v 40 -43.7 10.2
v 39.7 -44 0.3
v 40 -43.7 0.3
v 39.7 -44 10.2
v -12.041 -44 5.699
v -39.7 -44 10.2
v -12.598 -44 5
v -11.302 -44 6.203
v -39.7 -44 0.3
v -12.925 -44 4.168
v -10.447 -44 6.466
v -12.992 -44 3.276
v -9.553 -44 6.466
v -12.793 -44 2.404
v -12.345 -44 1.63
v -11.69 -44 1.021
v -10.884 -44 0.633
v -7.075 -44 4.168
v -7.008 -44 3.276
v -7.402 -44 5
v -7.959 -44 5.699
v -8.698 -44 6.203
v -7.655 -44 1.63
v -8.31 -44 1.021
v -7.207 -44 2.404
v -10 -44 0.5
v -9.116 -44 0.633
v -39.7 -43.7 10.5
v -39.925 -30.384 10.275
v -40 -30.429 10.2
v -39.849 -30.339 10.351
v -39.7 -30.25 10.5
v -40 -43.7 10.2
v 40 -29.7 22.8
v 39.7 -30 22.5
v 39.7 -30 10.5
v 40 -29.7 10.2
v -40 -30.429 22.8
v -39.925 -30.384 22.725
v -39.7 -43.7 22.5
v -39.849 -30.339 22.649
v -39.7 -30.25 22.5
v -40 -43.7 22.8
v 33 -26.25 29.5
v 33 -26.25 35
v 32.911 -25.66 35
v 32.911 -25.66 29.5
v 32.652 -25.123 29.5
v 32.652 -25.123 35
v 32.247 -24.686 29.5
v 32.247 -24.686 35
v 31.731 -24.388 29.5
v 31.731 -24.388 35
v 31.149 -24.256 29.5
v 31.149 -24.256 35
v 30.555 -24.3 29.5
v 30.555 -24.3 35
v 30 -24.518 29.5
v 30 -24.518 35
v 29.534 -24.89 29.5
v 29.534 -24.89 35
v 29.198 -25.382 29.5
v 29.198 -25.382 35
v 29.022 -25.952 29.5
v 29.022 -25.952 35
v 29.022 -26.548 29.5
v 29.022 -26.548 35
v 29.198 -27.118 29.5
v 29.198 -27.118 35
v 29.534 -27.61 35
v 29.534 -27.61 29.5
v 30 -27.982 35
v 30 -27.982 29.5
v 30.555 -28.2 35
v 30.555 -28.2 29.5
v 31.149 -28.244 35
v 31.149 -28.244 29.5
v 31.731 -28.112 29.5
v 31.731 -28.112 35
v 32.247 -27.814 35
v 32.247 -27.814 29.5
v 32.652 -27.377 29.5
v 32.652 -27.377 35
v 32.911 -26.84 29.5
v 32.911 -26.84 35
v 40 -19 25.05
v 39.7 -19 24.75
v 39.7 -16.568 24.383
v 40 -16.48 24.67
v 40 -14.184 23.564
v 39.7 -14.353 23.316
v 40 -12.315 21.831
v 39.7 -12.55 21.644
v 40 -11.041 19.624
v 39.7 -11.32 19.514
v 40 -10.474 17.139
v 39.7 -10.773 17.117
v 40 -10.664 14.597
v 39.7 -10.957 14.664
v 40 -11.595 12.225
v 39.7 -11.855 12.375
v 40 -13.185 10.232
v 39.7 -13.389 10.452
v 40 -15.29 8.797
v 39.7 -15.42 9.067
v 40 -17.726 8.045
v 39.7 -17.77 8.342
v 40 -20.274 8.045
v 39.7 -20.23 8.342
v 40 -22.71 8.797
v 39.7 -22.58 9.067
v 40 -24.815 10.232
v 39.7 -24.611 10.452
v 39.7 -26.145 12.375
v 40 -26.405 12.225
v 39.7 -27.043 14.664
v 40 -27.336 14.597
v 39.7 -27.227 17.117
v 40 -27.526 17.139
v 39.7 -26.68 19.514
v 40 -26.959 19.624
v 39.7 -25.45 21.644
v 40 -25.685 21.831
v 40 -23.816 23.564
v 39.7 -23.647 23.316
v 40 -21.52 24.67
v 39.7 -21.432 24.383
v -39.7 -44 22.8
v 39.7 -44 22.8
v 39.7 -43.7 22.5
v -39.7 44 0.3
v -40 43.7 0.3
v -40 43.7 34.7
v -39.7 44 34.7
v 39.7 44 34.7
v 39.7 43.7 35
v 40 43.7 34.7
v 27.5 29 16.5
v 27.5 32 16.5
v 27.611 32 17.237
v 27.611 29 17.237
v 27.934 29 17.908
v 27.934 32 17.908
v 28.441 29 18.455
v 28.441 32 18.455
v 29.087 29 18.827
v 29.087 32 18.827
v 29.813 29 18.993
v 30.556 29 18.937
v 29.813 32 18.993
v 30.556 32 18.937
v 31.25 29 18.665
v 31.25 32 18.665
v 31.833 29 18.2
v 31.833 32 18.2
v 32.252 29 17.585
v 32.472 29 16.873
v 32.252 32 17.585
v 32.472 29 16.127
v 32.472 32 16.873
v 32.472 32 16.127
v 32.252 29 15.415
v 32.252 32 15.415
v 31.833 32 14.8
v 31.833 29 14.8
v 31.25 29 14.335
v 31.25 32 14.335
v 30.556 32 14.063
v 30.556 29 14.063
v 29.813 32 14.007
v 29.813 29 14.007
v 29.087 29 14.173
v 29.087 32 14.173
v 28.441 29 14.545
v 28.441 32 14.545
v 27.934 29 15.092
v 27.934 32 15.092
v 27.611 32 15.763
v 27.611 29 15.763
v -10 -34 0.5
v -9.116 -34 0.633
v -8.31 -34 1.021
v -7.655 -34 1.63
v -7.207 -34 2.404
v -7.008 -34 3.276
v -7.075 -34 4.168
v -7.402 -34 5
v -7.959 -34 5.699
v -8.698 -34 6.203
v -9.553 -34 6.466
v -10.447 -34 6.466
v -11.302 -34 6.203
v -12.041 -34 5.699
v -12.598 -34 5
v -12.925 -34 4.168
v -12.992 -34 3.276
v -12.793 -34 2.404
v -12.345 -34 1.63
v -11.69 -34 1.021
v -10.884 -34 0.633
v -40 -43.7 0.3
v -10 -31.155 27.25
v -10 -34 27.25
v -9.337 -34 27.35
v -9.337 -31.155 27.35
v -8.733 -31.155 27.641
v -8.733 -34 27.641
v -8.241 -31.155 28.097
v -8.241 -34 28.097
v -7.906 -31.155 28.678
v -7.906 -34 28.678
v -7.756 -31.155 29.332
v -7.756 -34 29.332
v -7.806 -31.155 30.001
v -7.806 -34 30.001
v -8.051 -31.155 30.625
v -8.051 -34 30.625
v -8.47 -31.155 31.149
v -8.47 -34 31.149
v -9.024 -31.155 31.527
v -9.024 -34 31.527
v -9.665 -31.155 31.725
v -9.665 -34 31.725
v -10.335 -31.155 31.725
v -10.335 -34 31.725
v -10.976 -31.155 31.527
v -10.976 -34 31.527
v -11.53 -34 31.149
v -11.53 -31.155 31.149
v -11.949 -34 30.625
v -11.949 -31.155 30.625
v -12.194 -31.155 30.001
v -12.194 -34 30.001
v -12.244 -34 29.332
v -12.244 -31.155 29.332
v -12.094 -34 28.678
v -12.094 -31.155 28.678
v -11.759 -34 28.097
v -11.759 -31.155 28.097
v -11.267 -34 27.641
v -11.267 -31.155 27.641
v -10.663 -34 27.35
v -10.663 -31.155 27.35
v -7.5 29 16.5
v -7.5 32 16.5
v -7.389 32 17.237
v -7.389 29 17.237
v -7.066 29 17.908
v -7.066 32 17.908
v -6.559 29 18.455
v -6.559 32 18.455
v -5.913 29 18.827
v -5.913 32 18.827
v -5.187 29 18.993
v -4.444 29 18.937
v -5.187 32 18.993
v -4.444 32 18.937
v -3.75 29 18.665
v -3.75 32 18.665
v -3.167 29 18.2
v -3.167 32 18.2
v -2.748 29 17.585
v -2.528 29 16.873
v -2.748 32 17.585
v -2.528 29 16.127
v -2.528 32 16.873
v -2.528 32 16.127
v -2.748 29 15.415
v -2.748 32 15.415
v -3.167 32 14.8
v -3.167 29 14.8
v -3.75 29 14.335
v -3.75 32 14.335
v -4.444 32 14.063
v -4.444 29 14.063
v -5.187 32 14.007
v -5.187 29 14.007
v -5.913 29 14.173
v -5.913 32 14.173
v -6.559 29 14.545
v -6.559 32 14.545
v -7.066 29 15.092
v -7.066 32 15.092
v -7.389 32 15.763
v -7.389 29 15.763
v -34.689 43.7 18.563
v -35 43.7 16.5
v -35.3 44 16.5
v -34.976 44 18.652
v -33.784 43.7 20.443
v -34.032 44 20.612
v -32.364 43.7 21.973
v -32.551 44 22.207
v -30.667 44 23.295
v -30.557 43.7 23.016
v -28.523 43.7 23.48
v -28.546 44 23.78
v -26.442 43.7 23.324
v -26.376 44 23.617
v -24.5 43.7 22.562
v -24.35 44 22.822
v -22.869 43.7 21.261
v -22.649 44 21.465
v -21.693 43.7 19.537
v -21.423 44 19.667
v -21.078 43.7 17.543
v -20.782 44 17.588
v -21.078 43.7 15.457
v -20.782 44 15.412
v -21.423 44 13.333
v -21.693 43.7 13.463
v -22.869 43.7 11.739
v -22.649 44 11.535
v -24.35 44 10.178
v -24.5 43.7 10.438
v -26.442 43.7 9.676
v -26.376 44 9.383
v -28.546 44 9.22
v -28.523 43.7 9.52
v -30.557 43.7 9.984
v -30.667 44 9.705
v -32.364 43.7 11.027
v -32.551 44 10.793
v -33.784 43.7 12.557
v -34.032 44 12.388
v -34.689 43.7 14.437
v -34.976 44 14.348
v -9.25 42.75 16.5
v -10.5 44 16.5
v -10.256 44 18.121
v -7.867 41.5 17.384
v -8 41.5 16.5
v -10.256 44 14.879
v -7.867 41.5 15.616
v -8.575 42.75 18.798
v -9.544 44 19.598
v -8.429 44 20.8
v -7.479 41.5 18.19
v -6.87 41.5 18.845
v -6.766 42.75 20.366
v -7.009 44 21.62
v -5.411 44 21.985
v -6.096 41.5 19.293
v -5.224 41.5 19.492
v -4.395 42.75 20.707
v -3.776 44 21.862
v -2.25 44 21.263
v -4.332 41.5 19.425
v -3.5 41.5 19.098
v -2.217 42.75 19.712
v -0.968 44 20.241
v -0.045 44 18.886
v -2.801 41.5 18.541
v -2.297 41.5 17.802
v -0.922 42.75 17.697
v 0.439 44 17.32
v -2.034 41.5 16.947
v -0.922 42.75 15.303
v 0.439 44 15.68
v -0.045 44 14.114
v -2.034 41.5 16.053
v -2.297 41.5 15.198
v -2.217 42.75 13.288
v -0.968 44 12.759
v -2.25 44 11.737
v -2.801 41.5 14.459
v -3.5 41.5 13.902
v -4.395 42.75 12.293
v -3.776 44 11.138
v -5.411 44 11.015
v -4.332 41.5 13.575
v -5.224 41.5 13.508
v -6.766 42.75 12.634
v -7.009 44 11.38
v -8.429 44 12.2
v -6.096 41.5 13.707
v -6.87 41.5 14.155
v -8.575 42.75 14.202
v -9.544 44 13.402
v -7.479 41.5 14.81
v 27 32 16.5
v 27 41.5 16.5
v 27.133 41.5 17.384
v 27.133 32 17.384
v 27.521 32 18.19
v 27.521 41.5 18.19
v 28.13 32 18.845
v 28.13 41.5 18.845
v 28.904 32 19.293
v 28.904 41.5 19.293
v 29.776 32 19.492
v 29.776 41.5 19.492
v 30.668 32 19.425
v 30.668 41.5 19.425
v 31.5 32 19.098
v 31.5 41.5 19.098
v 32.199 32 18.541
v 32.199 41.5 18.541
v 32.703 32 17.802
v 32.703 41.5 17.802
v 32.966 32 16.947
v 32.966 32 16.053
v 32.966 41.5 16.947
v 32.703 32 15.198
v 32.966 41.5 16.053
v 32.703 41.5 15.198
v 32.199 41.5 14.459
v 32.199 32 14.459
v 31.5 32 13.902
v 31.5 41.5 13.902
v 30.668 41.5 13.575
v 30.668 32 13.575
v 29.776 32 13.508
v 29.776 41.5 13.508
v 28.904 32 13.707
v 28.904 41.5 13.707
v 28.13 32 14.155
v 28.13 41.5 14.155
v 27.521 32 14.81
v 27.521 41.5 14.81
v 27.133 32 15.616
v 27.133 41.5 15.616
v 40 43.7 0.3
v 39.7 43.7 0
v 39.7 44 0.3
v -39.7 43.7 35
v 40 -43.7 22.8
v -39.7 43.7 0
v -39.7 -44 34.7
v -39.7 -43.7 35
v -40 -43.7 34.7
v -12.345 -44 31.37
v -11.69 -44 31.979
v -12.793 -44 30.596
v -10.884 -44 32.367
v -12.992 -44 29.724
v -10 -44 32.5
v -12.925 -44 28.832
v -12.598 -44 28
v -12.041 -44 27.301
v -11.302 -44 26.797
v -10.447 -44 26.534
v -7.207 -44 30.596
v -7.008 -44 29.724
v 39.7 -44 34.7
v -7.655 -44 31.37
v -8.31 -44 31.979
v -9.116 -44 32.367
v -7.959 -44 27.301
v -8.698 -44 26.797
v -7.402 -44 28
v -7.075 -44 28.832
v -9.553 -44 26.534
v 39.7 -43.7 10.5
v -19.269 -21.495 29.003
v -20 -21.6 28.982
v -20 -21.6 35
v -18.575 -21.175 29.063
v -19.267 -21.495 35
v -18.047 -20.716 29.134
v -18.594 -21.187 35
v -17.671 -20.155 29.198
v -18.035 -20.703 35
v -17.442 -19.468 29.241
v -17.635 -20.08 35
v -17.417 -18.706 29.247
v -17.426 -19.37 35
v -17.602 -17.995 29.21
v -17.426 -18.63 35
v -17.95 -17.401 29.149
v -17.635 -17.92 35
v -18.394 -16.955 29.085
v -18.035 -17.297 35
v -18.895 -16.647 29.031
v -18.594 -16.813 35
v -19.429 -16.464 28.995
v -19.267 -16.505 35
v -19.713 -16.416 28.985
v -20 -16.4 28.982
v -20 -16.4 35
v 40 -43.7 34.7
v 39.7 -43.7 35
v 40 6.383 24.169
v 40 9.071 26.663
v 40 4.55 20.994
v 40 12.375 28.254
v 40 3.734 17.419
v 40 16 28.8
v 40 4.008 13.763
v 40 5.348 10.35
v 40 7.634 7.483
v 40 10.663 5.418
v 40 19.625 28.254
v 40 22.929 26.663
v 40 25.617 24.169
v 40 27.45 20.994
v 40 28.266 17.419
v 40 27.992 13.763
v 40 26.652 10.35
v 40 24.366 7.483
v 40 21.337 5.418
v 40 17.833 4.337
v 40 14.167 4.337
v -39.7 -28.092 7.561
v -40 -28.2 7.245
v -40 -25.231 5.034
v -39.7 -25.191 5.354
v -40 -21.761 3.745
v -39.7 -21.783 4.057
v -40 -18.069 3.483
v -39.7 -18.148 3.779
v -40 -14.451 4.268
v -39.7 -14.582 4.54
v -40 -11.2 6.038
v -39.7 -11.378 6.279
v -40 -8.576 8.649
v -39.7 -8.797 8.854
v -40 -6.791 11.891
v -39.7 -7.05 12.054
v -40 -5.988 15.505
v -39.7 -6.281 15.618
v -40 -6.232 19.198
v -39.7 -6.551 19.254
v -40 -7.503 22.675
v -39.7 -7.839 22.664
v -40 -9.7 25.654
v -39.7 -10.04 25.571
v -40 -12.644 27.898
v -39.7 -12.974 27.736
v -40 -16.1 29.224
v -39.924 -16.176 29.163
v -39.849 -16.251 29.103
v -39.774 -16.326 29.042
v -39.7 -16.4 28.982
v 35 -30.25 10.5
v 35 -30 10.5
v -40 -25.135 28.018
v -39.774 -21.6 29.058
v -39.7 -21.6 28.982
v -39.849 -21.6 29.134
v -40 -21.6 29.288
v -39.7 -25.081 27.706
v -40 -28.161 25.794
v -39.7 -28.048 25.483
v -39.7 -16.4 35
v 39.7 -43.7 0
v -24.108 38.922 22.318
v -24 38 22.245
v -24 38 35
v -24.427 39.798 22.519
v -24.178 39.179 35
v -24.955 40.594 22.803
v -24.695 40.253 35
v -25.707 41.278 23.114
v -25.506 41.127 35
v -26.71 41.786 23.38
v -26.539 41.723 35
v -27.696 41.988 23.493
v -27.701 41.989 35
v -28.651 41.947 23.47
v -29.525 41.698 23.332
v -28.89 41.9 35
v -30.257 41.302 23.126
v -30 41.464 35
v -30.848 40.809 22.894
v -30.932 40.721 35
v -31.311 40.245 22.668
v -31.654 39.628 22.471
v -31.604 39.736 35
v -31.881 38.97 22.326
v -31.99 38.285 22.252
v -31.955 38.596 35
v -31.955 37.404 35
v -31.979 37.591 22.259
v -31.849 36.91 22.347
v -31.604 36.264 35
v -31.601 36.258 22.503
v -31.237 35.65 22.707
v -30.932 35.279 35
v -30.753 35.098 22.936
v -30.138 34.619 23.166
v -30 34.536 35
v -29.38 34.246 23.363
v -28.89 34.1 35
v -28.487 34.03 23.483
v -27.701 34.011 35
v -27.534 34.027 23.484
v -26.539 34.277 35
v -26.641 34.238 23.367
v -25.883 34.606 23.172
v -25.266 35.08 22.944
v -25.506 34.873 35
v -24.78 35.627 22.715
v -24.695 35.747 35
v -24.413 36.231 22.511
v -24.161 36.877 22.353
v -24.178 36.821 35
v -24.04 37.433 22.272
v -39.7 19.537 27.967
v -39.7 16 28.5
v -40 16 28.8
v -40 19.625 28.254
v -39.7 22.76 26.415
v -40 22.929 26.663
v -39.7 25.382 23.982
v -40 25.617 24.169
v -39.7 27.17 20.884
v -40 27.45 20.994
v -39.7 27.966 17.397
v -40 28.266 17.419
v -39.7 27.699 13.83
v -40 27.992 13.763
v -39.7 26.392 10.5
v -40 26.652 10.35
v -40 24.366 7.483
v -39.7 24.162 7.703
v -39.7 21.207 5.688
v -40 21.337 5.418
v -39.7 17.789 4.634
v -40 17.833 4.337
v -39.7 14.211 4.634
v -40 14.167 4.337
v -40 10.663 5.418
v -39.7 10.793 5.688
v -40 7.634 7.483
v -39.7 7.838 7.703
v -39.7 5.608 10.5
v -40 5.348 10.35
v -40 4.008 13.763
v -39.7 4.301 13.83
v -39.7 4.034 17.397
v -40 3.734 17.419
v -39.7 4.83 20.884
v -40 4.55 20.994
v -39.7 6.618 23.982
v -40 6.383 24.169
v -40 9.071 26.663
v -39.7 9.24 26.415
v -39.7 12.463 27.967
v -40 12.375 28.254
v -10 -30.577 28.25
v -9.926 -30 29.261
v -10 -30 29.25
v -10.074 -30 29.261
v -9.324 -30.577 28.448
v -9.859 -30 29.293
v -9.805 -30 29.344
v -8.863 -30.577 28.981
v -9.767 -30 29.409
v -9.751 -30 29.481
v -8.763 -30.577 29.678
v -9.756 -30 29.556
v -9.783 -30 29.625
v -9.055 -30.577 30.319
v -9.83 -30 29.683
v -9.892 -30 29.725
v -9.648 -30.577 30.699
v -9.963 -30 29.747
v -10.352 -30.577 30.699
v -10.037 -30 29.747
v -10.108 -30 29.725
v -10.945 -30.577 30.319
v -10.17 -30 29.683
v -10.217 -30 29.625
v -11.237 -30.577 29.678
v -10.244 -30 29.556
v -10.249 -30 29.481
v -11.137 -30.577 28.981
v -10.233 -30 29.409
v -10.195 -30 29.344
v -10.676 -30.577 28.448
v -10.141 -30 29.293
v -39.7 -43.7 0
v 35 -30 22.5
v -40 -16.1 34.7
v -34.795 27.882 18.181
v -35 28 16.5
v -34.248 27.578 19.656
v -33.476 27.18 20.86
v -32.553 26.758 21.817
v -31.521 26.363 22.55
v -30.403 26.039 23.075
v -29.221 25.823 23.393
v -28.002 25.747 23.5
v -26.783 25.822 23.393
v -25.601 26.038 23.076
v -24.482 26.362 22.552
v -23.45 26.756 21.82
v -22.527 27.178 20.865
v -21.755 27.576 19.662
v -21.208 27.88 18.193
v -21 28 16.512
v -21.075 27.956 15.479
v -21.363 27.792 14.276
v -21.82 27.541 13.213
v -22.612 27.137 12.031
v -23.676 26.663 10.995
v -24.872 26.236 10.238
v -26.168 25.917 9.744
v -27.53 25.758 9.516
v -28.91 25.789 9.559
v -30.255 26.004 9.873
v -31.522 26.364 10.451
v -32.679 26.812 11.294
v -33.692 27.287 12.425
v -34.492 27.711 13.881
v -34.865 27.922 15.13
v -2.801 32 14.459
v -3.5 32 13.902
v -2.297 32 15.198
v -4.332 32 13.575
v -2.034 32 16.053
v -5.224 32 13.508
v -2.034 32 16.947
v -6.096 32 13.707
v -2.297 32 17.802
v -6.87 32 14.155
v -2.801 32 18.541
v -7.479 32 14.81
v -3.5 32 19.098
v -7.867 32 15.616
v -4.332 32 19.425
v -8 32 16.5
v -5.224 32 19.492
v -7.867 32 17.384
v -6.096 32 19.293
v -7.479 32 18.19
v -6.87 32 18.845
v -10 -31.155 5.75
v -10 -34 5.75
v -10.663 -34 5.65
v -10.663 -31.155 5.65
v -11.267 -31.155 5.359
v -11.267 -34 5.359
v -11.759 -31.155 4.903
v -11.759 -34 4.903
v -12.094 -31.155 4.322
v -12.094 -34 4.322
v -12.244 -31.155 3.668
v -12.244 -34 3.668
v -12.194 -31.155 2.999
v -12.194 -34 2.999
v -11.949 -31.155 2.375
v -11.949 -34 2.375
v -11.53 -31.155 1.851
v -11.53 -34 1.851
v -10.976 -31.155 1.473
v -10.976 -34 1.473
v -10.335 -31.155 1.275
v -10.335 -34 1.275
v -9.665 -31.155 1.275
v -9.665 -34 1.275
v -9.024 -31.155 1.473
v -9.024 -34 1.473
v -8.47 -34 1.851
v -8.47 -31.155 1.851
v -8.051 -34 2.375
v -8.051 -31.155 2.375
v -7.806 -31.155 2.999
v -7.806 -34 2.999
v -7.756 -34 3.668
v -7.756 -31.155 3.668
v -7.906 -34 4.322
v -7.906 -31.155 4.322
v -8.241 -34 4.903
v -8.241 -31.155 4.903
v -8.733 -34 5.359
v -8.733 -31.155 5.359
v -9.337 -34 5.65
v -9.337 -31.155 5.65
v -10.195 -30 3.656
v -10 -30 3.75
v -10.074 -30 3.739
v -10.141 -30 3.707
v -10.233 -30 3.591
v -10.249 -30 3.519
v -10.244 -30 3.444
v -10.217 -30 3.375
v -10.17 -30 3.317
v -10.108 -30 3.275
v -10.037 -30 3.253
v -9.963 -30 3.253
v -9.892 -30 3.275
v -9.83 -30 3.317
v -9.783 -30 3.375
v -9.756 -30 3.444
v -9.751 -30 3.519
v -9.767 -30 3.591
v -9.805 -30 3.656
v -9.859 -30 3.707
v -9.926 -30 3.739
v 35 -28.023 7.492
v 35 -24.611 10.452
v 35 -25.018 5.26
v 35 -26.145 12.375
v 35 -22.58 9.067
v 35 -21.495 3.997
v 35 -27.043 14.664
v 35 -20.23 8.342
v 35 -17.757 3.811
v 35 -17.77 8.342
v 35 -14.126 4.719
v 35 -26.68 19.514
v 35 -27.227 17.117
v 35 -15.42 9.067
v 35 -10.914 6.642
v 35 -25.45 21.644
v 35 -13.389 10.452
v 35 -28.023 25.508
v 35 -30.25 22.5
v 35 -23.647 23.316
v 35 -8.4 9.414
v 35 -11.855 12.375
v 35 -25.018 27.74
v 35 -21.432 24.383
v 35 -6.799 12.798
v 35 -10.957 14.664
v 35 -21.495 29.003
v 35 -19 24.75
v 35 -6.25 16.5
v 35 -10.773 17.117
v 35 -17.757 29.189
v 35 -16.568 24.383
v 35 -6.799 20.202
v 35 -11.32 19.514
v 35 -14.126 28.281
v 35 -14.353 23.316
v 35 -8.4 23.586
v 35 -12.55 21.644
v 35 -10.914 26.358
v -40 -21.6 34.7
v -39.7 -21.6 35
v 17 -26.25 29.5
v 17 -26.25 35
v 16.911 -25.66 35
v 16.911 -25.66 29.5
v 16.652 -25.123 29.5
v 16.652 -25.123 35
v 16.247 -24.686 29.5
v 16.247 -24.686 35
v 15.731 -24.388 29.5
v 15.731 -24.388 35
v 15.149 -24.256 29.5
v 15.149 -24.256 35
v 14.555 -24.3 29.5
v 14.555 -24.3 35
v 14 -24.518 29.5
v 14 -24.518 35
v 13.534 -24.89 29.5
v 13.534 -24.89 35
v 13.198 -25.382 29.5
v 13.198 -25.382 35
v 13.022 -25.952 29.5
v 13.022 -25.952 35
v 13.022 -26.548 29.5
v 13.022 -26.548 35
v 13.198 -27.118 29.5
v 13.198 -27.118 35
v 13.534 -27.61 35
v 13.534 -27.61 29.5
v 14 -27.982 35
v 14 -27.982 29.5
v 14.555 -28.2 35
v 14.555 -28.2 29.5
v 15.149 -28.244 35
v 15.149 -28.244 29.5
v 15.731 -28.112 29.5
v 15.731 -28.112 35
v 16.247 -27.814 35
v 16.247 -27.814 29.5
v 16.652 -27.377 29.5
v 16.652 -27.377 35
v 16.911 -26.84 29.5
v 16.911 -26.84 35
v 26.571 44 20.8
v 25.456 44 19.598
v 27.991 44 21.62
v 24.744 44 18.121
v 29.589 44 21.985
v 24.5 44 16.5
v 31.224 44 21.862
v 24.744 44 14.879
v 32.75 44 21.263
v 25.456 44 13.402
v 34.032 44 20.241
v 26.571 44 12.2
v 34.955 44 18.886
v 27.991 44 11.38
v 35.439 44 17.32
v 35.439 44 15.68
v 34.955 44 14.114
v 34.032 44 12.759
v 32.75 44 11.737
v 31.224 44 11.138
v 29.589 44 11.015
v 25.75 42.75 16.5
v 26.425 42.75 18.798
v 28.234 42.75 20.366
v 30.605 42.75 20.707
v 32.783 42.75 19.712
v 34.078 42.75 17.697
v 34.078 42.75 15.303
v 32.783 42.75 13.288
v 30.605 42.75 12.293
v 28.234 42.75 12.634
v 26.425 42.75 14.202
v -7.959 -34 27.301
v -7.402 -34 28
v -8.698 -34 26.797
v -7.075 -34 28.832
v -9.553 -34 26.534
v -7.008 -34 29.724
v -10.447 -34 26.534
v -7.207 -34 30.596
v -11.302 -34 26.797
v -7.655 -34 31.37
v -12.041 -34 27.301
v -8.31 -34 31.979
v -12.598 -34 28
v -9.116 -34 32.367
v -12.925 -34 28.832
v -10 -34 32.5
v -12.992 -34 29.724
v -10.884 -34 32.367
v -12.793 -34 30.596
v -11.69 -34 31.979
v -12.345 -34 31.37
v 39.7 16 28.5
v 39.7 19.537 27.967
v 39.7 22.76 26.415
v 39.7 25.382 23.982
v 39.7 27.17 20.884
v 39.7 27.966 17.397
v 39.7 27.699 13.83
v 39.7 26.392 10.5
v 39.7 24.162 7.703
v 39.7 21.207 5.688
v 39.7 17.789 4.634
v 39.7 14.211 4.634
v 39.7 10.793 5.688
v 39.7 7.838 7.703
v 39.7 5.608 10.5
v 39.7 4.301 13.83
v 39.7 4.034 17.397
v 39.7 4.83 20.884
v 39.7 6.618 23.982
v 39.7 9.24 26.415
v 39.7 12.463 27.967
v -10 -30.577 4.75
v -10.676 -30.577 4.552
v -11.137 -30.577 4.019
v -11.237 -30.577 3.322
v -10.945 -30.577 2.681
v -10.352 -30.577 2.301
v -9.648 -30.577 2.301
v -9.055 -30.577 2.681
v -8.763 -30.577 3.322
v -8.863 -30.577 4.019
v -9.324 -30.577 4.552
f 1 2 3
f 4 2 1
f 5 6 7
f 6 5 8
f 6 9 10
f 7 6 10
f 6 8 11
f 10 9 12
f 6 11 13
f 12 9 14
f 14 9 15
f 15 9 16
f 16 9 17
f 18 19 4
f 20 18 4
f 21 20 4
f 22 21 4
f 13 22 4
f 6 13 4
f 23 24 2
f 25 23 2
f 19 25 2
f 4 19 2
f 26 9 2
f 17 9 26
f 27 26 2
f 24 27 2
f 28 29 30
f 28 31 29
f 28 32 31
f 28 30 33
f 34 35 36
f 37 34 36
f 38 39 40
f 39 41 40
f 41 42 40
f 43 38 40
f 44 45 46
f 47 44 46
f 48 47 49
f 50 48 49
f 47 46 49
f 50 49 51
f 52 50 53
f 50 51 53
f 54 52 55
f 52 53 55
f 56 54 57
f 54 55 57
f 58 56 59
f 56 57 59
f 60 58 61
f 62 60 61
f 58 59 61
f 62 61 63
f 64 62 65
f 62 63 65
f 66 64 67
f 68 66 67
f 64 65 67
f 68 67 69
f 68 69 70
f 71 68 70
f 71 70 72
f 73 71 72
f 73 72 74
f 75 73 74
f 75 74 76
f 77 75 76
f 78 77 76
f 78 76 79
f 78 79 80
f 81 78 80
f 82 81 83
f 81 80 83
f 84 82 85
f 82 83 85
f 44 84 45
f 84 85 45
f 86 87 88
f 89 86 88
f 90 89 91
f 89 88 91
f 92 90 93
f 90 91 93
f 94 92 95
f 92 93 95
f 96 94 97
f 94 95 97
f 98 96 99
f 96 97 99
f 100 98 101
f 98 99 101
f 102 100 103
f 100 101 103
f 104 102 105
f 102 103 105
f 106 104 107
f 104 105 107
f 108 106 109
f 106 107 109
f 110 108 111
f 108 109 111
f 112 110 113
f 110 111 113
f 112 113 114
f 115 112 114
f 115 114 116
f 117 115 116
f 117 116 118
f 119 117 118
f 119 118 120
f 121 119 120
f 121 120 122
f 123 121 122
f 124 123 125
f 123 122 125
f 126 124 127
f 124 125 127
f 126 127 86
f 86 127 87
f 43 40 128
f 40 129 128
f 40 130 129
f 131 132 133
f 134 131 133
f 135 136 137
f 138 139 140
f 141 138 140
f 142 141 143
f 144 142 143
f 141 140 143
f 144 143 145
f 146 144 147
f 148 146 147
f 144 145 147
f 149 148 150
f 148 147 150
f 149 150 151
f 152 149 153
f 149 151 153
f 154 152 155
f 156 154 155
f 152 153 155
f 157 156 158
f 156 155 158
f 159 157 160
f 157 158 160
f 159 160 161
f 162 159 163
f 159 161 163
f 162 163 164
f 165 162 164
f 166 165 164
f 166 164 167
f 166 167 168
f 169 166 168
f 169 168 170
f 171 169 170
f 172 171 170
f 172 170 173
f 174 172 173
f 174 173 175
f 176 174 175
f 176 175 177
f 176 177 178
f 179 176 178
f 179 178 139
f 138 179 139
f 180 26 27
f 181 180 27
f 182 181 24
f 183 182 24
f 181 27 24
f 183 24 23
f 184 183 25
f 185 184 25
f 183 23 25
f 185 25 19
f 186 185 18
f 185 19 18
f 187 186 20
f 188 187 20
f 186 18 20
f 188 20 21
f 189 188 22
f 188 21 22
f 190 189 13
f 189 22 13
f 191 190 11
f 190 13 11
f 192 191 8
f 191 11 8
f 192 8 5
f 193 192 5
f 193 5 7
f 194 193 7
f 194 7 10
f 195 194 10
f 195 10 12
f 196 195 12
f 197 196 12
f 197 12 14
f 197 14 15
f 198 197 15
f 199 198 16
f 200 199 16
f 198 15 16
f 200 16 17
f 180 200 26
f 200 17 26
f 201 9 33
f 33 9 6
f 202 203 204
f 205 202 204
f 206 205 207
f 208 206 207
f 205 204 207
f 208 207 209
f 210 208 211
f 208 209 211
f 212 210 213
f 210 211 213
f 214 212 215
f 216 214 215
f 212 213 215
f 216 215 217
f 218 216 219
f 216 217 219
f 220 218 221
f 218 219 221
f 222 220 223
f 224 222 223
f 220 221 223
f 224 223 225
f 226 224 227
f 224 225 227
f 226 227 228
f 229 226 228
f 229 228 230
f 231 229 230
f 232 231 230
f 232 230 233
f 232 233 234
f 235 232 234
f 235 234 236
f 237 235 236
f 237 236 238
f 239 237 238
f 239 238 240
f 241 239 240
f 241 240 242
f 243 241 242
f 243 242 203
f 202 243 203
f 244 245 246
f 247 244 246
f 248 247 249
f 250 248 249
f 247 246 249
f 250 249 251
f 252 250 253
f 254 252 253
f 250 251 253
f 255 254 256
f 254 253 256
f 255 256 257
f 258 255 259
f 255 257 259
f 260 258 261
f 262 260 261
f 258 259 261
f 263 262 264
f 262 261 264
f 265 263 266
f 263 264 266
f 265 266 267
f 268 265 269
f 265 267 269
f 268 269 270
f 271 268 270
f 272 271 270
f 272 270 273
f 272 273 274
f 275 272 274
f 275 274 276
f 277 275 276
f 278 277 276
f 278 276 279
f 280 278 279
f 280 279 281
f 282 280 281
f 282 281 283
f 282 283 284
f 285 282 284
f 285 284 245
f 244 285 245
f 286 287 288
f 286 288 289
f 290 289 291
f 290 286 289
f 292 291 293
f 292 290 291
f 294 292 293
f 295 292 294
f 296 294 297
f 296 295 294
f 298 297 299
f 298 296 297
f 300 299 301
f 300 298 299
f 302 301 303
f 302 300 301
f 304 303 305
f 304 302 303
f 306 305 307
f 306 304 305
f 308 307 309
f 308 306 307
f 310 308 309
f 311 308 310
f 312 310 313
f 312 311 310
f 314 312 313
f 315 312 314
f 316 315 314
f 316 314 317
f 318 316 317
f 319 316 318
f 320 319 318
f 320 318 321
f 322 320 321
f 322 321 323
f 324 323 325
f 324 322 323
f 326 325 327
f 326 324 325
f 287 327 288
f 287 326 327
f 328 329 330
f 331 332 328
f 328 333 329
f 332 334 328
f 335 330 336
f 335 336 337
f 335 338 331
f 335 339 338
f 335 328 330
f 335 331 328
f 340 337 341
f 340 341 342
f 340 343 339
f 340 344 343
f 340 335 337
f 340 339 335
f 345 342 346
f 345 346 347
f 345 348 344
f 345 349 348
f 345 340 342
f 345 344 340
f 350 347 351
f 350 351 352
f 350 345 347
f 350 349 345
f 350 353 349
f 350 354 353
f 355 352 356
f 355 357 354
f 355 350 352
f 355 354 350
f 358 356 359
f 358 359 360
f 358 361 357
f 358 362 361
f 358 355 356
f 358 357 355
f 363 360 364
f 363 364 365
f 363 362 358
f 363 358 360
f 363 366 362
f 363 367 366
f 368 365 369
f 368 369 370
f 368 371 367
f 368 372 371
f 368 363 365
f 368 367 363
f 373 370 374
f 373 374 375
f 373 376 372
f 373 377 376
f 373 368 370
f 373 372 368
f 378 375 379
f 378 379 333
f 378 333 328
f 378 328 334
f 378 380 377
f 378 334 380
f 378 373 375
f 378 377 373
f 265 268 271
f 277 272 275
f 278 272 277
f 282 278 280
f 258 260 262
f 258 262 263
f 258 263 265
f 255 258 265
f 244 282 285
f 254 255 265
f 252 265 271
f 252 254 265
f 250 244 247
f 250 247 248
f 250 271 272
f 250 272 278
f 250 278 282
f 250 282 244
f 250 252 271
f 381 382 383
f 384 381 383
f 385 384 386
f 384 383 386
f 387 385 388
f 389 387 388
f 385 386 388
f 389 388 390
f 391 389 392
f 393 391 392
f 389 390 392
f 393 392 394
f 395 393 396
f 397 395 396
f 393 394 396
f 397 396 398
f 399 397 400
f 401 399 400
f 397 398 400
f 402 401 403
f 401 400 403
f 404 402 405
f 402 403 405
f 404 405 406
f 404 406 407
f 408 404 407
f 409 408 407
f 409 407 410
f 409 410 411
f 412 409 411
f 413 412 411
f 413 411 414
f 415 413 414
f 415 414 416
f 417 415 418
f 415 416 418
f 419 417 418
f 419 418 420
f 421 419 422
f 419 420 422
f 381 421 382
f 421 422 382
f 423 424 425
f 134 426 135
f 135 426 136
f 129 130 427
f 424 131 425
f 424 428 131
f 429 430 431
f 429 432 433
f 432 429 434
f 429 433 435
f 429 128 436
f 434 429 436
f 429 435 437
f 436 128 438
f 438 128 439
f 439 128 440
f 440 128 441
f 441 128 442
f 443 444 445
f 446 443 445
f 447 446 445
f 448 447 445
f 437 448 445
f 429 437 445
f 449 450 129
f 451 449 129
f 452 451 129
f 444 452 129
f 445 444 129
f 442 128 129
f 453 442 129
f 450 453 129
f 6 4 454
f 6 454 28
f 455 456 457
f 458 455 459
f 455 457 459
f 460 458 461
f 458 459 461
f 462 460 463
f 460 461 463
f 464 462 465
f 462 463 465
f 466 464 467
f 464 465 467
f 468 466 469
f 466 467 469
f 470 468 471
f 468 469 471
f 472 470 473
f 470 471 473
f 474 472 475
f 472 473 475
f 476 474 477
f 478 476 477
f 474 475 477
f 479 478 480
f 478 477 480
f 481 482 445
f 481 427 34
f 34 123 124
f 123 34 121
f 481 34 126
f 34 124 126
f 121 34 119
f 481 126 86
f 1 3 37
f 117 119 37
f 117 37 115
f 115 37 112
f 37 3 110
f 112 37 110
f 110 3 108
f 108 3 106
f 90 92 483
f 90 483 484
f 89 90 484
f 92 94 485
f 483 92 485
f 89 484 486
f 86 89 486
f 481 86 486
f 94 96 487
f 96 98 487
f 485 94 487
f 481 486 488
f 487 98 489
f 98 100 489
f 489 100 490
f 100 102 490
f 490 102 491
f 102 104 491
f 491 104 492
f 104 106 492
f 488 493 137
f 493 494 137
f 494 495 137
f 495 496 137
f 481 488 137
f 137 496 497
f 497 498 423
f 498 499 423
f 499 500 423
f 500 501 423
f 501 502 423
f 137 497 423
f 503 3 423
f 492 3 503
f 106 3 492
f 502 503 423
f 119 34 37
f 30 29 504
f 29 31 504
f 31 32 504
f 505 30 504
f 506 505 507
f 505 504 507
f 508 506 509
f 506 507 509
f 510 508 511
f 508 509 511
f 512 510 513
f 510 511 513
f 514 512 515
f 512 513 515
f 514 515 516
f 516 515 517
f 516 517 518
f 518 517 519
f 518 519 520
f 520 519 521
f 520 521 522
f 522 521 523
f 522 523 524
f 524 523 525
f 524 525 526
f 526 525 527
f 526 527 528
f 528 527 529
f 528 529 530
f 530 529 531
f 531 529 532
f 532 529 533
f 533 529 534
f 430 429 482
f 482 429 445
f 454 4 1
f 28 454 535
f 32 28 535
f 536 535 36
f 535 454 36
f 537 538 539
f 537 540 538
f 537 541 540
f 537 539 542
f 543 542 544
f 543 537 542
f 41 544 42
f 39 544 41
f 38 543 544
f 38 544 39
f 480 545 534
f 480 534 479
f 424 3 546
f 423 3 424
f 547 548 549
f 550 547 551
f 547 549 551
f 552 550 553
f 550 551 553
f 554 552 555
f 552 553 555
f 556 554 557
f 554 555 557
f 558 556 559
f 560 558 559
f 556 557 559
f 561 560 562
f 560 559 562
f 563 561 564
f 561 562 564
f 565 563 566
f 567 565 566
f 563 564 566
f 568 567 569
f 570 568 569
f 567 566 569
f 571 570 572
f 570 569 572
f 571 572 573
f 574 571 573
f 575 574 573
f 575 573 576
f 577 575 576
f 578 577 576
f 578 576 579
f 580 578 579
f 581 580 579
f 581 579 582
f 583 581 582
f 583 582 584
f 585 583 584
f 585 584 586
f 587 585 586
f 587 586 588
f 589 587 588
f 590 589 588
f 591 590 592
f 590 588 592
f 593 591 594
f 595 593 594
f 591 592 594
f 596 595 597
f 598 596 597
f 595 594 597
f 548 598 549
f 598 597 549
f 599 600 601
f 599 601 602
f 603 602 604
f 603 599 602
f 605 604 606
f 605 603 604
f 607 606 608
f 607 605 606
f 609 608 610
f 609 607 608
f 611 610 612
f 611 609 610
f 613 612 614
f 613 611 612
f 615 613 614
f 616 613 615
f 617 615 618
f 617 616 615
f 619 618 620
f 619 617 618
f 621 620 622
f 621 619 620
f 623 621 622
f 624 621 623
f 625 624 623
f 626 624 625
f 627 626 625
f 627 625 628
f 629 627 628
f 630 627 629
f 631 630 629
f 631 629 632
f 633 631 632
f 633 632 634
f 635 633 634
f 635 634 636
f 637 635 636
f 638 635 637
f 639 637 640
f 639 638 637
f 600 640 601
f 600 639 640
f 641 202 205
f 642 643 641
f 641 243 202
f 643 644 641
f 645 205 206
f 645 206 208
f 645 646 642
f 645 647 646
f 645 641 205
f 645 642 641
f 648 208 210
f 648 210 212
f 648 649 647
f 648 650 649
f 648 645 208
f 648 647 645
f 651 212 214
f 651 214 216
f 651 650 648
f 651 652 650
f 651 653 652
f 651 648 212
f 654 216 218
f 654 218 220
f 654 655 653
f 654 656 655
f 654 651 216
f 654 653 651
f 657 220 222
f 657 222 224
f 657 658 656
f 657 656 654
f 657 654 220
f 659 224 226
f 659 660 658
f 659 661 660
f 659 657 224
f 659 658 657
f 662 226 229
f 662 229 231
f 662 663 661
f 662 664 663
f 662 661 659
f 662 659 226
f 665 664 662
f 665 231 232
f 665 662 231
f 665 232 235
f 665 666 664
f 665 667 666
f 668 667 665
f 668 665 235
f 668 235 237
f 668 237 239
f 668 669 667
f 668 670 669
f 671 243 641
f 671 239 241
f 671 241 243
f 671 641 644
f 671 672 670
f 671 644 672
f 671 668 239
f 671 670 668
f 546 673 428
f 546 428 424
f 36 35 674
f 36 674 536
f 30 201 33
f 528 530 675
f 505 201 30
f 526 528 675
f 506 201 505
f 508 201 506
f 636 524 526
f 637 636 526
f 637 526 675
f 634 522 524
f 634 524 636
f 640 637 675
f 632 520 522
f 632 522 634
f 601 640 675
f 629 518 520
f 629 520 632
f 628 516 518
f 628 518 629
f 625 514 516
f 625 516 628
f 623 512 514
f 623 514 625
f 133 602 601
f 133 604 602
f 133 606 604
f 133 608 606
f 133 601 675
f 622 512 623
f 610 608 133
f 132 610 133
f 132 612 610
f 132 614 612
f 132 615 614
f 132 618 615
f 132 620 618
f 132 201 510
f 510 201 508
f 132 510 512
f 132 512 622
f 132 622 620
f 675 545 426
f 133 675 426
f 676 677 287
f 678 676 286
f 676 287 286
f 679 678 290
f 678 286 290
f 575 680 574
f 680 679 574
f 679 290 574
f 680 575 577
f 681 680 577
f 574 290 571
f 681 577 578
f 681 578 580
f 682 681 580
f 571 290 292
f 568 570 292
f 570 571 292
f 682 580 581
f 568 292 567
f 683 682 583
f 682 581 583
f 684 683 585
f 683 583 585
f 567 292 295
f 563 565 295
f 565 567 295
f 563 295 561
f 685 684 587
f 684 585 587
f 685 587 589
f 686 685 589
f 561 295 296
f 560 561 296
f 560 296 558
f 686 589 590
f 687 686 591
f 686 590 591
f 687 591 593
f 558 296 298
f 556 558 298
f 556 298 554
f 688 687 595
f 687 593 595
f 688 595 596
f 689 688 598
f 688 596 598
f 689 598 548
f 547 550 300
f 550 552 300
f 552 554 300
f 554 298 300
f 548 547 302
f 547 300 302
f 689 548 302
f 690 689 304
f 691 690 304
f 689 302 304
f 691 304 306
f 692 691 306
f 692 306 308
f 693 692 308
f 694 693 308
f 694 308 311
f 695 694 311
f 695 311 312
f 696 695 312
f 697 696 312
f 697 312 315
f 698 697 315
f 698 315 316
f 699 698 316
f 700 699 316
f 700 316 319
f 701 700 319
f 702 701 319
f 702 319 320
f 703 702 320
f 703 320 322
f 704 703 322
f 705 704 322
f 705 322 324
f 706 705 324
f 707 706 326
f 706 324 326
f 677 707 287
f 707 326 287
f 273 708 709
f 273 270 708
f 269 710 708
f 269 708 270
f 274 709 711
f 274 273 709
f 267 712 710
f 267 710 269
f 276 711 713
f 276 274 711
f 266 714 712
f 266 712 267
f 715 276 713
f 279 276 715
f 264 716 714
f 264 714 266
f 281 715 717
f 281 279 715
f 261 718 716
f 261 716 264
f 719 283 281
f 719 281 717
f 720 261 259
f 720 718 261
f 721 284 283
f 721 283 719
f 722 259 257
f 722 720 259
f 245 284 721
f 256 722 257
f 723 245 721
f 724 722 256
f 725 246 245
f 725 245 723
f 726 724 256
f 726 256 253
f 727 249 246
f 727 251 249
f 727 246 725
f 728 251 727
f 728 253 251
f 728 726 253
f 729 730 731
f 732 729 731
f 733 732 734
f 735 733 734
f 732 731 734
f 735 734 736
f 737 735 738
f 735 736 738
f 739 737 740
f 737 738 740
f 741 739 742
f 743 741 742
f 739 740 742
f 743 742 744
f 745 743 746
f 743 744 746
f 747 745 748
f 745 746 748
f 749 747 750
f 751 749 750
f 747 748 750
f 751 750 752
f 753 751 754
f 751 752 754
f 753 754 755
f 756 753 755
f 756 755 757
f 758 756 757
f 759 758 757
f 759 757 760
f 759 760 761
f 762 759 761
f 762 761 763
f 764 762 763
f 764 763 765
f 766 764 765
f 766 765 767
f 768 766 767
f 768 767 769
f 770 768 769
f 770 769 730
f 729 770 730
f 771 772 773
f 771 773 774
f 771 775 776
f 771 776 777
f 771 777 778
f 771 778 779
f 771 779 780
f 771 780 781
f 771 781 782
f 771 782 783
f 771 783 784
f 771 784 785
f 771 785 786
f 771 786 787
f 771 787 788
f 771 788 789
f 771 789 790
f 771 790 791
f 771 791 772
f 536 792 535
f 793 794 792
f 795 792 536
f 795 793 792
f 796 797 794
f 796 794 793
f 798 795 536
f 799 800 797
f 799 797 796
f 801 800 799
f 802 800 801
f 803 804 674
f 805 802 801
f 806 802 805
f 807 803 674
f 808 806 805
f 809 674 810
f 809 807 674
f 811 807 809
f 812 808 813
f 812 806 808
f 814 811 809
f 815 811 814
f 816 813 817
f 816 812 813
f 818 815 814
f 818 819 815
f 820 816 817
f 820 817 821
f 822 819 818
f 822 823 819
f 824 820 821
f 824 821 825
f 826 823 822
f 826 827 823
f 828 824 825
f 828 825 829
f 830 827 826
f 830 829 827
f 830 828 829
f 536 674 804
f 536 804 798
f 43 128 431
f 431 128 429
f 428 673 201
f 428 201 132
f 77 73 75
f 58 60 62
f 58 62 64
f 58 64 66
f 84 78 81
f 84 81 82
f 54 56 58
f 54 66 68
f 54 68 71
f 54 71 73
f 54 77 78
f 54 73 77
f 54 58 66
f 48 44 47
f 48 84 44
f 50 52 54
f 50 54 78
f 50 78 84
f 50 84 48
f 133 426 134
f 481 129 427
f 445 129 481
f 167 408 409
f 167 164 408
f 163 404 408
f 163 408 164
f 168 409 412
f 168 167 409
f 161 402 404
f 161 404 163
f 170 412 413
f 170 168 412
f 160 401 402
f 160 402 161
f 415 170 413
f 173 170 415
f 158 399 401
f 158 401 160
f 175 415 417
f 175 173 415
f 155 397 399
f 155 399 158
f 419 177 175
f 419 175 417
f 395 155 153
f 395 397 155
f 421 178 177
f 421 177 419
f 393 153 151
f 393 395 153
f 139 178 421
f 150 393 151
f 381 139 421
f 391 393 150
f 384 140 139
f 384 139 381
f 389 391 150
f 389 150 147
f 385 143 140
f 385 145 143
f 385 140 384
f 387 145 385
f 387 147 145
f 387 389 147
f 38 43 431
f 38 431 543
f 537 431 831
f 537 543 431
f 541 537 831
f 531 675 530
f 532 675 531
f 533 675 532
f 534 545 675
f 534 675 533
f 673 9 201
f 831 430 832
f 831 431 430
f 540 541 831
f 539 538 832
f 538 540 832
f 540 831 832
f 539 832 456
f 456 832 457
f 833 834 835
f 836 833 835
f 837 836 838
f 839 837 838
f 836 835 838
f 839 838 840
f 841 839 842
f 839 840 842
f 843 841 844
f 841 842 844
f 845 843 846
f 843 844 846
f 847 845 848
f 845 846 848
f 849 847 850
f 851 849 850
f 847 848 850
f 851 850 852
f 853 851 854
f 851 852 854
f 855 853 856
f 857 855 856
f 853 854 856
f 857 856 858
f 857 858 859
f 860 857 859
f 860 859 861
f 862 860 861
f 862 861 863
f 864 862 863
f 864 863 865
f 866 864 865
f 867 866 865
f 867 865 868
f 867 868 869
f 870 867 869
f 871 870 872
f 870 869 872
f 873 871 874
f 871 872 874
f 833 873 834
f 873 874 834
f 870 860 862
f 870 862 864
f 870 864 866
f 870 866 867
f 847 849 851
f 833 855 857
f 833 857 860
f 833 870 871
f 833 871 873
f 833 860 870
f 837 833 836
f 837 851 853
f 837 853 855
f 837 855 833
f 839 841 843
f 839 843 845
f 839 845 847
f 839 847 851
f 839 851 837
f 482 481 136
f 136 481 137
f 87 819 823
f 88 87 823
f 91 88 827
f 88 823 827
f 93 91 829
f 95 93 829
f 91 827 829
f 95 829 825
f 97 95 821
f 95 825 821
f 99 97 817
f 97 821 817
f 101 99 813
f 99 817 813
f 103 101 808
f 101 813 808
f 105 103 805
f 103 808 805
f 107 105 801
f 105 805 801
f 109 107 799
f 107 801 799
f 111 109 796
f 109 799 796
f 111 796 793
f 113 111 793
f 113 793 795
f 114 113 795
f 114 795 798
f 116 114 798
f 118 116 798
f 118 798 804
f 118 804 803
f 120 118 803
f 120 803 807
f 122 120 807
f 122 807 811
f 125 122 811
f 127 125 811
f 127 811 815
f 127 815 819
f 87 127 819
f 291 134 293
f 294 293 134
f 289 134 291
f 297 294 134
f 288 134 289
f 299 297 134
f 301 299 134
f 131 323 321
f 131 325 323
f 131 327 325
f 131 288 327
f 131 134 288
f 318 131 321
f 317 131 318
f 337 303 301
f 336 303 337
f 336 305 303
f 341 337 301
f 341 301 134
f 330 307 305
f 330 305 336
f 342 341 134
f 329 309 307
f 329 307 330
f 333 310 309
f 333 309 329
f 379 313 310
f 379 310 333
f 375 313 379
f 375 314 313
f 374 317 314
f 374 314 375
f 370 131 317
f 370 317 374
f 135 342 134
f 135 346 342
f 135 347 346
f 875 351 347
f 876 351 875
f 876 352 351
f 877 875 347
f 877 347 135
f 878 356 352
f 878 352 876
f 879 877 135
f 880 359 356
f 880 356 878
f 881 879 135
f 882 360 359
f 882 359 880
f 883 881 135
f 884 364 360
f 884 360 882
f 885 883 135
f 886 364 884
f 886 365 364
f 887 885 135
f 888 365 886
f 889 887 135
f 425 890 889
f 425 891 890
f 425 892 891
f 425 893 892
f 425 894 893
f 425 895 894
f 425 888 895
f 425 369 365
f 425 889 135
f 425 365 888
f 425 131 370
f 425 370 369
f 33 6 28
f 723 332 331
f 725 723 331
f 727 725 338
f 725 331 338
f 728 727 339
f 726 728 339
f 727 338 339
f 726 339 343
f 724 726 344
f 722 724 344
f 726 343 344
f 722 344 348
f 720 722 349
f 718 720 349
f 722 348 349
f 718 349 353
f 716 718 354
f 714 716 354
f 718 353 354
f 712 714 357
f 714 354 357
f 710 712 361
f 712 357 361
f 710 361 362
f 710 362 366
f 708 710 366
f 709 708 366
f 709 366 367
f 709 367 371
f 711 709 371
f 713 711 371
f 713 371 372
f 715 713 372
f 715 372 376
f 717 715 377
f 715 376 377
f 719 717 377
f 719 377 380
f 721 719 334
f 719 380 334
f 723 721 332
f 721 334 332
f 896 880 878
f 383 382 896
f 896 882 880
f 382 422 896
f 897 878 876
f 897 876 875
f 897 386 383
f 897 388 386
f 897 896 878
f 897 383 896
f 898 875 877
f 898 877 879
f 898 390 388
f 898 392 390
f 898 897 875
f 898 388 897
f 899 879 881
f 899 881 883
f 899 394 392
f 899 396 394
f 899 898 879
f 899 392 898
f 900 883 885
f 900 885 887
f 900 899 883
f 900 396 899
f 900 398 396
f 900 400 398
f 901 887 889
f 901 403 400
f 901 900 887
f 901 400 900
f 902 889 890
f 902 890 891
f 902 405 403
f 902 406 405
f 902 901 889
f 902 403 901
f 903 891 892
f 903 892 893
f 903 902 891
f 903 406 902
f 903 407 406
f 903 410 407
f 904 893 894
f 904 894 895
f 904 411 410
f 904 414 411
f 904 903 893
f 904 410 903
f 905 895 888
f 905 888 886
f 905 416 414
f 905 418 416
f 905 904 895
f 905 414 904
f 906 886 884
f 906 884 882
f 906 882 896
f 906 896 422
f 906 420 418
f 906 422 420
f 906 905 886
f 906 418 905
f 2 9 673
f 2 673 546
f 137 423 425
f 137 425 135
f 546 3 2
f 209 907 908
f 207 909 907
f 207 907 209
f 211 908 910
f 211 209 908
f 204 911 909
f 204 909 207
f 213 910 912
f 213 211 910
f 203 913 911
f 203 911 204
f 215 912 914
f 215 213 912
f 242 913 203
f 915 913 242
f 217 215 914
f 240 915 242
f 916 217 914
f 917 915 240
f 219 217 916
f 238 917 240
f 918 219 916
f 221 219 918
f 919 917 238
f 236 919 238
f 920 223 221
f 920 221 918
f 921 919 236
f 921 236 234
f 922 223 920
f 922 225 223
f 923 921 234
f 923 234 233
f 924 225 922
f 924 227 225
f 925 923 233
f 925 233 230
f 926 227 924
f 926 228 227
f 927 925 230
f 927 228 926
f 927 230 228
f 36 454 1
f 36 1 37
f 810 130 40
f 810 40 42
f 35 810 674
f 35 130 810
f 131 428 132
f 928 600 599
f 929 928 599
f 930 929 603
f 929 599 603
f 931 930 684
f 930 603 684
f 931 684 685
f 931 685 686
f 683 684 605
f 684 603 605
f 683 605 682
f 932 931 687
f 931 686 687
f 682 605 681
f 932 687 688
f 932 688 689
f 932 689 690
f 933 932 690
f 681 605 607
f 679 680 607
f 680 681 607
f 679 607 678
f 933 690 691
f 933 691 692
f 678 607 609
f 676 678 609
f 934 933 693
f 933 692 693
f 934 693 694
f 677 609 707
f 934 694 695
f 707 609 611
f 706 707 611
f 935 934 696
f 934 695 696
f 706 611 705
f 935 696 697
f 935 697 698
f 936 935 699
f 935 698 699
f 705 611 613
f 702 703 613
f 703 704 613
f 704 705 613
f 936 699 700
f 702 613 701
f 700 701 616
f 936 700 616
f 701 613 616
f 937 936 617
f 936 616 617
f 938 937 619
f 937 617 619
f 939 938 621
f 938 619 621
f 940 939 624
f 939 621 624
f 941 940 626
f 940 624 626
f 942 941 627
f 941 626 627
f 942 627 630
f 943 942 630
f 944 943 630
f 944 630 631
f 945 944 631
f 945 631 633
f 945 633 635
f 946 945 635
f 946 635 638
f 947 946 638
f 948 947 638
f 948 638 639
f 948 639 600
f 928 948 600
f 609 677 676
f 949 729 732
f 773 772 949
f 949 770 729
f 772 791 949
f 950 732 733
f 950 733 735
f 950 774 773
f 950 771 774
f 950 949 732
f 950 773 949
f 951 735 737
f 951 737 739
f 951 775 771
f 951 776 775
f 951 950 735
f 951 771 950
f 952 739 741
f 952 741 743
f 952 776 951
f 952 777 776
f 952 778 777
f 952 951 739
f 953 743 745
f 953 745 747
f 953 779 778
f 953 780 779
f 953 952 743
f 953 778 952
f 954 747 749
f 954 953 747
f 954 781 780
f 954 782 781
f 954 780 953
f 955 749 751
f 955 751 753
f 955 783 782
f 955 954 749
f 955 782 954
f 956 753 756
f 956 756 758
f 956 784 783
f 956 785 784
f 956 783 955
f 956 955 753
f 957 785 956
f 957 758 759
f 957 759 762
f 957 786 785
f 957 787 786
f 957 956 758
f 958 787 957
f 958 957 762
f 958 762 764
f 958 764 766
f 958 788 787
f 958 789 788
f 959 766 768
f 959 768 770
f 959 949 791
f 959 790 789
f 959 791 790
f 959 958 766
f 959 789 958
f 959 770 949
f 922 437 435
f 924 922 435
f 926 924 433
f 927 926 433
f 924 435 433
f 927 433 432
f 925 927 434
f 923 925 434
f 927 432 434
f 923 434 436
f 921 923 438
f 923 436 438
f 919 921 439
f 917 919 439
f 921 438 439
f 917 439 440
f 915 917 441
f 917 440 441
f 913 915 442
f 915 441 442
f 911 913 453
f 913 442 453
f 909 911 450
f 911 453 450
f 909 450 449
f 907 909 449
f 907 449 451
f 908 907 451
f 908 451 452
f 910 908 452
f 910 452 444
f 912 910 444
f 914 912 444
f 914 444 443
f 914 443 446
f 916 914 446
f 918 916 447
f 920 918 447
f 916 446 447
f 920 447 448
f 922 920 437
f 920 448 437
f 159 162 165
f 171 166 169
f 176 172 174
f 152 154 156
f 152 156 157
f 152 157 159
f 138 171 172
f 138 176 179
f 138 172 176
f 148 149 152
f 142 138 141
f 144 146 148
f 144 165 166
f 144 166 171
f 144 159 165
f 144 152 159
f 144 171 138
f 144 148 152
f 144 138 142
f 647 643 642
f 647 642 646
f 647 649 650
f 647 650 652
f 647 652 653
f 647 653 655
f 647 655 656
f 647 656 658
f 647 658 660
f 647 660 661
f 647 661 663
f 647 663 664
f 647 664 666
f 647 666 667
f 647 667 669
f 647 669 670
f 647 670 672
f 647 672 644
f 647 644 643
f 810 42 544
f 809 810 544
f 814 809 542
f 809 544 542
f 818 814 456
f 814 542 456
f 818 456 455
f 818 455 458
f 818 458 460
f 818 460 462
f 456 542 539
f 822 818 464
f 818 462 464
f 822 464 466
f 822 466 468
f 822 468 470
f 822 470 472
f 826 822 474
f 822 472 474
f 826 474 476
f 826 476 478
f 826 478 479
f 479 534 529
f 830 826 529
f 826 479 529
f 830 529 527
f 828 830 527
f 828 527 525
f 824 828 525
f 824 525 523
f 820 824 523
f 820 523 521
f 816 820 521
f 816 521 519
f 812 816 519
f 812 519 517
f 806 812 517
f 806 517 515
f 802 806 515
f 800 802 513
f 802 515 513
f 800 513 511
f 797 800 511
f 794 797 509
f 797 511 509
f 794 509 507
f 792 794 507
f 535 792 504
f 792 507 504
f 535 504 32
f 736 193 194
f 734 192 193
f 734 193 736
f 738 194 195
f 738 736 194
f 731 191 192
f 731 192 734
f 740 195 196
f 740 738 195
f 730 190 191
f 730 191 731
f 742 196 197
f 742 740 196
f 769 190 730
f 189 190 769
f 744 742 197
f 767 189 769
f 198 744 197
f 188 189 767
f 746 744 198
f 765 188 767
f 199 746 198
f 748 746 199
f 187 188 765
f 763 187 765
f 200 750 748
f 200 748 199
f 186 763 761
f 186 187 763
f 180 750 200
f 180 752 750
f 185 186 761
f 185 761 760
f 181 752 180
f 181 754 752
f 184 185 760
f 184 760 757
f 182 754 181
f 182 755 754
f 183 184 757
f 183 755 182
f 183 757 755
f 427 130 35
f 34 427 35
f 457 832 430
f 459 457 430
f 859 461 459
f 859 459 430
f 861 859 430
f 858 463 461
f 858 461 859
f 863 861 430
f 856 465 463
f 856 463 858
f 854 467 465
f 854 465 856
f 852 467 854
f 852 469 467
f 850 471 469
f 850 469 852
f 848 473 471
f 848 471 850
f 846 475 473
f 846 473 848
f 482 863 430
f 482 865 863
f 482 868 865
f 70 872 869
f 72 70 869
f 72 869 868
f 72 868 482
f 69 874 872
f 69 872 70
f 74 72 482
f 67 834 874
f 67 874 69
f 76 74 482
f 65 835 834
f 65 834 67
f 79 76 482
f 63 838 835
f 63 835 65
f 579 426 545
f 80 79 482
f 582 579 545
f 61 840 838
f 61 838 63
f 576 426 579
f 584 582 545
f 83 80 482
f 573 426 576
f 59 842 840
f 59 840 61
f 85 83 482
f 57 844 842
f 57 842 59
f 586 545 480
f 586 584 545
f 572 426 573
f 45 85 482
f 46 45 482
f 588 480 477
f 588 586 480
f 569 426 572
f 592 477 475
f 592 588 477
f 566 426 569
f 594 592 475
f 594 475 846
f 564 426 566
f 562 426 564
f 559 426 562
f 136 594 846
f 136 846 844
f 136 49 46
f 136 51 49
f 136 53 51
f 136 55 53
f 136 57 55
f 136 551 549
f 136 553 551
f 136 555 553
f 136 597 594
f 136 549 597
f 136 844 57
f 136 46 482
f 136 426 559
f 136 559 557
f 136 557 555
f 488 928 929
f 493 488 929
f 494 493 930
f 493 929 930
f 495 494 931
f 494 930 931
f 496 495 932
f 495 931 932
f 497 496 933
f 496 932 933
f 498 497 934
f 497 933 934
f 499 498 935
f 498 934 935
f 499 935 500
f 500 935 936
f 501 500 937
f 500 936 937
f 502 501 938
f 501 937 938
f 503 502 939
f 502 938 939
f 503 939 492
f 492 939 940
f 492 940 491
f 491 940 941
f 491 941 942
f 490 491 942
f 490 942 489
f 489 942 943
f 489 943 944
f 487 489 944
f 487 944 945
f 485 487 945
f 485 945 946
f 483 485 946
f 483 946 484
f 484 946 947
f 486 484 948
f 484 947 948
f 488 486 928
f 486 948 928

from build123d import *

# Parameters (mm, degrees)
ESQUISSE1_W                   = 80
ESQUISSE1_H                   = 88
BASE_EXTRUSION_DEPTH          = 35
ESQUISSE4_R                   = 12
BOSS_EXTRU_2_DEPTH            = 80
ESQUISSE5_R                   = 12
ENL_V_MAT_EXTRU_1_DEPTH       = 145
ESQUISSE6_W                   = 12
ESQUISSE6_H                   = 14
ENL_V_MAT_EXTRU_2_DEPTH       = 145
ESQUISSE12_R                  = 12.75
ENL_V_MAT_EXTRU_4_DEPTH       = 75
ESQUISSE13_R                  = 8.25
ENL_V_MAT_EXTRU_5_DEPTH       = 94.733665244
ESQUISSE17_W                  = 20
ESQUISSE17_H                  = 5.2
ENL_V_MAT_EXTRU_9_DEPTH       = 10
ESQUISSE18_R                  = 2.6
ENL_V_MAT_EXTRU_10_DEPTH      = 10
ESQUISSE20_R                  = 2.25
ENL_V_MAT_EXTRU_12_DEPTH      = 14
ESQUISSE21_R                  = 3
ENL_V_MAT_EXTRU_13_DEPTH      = 10
CHANFREIN9_SIZE               = 1.154700538
CHANFREIN9_SIZE2              = 2
CHANFREIN20_SIZE              = 1.154700538
CHANFREIN20_SIZE2             = 2
ESQUISSE22_R                  = 2
ENL_V_MAT_EXTRU_15_DEPTH      = 5.5
ESQUISSE24_R                  = 7
ENL_V_MAT_EXTRU_23_DEPTH      = 25
ENL_V_MAT_EXTRU_24_REACH      = 71
ENL_V_MAT_EXTRU_24_END_RADIUS = 7
ESQUISSE25_R                  = 4
ESQUISSE26_R                  = 2.5
ENL_V_MAT_EXTRU_25_DEPTH      = 15
ESQUISSE28_R                  = 3
ENL_V_MAT_EXTRU_26_DEPTH      = 12
CHANFREIN27_SIZE              = 2.5
CHANFREIN29_SIZE              = 0.3


with BuildPart() as part:
    # Esquisse1 → Base-Extrusion (new body)
    with BuildSketch(Plane.XY):
        Rectangle(ESQUISSE1_W, ESQUISSE1_H)
    extrude(amount=BASE_EXTRUSION_DEPTH)

    # Esquisse4 → Boss.-Extru.2 (add, through all)
    with BuildSketch(Plane.ZY.offset(40)):
        with Locations((16.5, 16)):
            Circle(ESQUISSE4_R)
    extrude(amount=-BOSS_EXTRU_2_DEPTH)

    # Esquisse5 → Enlèv. mat.-Extru.1 (cut)
    with BuildSketch(Plane.ZY.offset(40)):
        with Locations((16.5, 16)):
            Circle(ESQUISSE5_R)
    extrude(amount=-ENL_V_MAT_EXTRU_1_DEPTH, mode=Mode.SUBTRACT)

    # Esquisse6 → Enlèv. mat.-Extru.2 (cut)
    with BuildSketch(Plane(origin=(40, 0, 0), x_dir=(0, 0, -1), z_dir=(1, 0, 0))):
        with Locations((-16.5, -37)):
            Rectangle(ESQUISSE6_W, ESQUISSE6_H)
    extrude(amount=-ENL_V_MAT_EXTRU_2_DEPTH, mode=Mode.SUBTRACT)

    # Esquisse12 → Enlèv. mat.-Extru.4 (cut)
    with BuildSketch(Plane.ZY.offset(40)):
        with Locations((16.5, -19)):
            Circle(ESQUISSE12_R)
    extrude(amount=-ENL_V_MAT_EXTRU_4_DEPTH, mode=Mode.SUBTRACT)

    # Esquisse13 → Enlèv. mat.-Extru.5 (cut, through all)
    with BuildSketch(Plane.ZY.offset(-35)):
        with Locations((16.5, -19)):
            Circle(ESQUISSE13_R)
    extrude(amount=-ENL_V_MAT_EXTRU_5_DEPTH, mode=Mode.SUBTRACT)

    # Esquisse17 → Enlèv. mat.-Extru.9 (cut)
    with BuildSketch(Plane.XY.offset(35)):
        with Locations((-30, -19)):
            Rectangle(ESQUISSE17_W, ESQUISSE17_H)
    extrude(amount=-ENL_V_MAT_EXTRU_9_DEPTH, mode=Mode.SUBTRACT)

    # Esquisse18 → Enlèv. mat.-Extru.10 (cut)
    with BuildSketch(Plane.XY.offset(35)):
        with Locations((-20, -19)):
            Circle(ESQUISSE18_R)
    extrude(amount=-ENL_V_MAT_EXTRU_10_DEPTH, mode=Mode.SUBTRACT)

    # Esquisse20 → Enlèv. mat.-Extru.12 (cut)
    with BuildSketch(Plane.XZ.offset(44)):
        with Locations(Location((-10, 29.5, 0), (0, 0, 270))):
            Circle(ESQUISSE20_R)
        with Locations(Location((-10, 3.5, 0), (0, 0, 90))):
            Circle(ESQUISSE20_R)
    extrude(amount=-ENL_V_MAT_EXTRU_12_DEPTH, mode=Mode.SUBTRACT)

    # Esquisse21 → Enlèv. mat.-Extru.13 (cut)
    with BuildSketch(Plane.XZ.offset(44)):
        with Locations(Location((-10, 3.5, 0), (0, 0, 270))):
            Circle(ESQUISSE21_R)
        with Locations(Location((-10, 29.5, 0), (0, 0, 90))):
            Circle(ESQUISSE21_R)
    extrude(amount=-ENL_V_MAT_EXTRU_13_DEPTH, mode=Mode.SUBTRACT)

    # Chanfrein9
    chanfrein9_edges = [part.edges().sort_by_distance(p)[0] for p in [
        (-10, -30, 1.25),
    ]]
    chanfrein9_side = [part.faces().sort_by_distance(p)[0] for p in [
        (-10, -32, 1.25),
    ]]
    chamfer(chanfrein9_edges, length=CHANFREIN9_SIZE, length2=CHANFREIN9_SIZE2, reference=chanfrein9_side[0])

    # Chanfrein20
    chanfrein20_edges = [part.edges().sort_by_distance(p)[0] for p in [
        (-10, -30, 31.75),
    ]]
    chanfrein20_side = [part.faces().sort_by_distance(p)[0] for p in [
        (-10, -32, 31.75),
    ]]
    chamfer(chanfrein20_edges, length=CHANFREIN20_SIZE, length2=CHANFREIN20_SIZE2, reference=chanfrein20_side[0])

    # Esquisse22 → Enlèv. mat.-Extru.15 (cut)
    with BuildSketch(Plane.XY.offset(35)):
        with Locations((31, -26.25)):
            Circle(ESQUISSE22_R)
        with Locations((15, -26.25)):
            Circle(ESQUISSE22_R)
    extrude(amount=-ENL_V_MAT_EXTRU_15_DEPTH, mode=Mode.SUBTRACT)

    # Esquisse24 → Enlèv. mat.-Extru.23 (cut)
    with BuildSketch(Plane(origin=(0, 44, 0), x_dir=(-1, 0, 0), z_dir=(0, 1, 0))):
        with Locations((28, 16.5)):
            Circle(ESQUISSE24_R)
    extrude(amount=-ENL_V_MAT_EXTRU_23_DEPTH, mode=Mode.SUBTRACT)

    # Enlèv. mat.-Extru.24: up to this cylinder (the profile starts outside it)
    enl_v_mat_extru_24_end = Plane(origin=(-28, 38, 16.5), z_dir=(0, 1, 0)) * Cylinder(ENL_V_MAT_EXTRU_24_END_RADIUS, 157, mode=Mode.PRIVATE)
    # Esquisse25 → Enlèv. mat.-Extru.24 (cut, up to the surface)
    with BuildSketch(Plane.XY.offset(35), mode=Mode.PRIVATE) as enl_v_mat_extru_24_sk1:
        with Locations((-28, 38)):
            Circle(ESQUISSE25_R)
    enl_v_mat_extru_24_tool1 = extrude(enl_v_mat_extru_24_sk1.sketch, amount=-ENL_V_MAT_EXTRU_24_REACH, mode=Mode.PRIVATE) - enl_v_mat_extru_24_end
    add(enl_v_mat_extru_24_tool1.solids().sort_by_distance((-28, 38, 35))[0], mode=Mode.SUBTRACT)

    # Esquisse26 → Enlèv. mat.-Extru.25 (cut)
    with BuildSketch(Plane(origin=(0, 44, 0), x_dir=(-1, 0, 0), z_dir=(0, 1, 0))):
        with Locations((-30, 16.5)):
            Circle(ESQUISSE26_R)
        with Locations((5, 16.5)):
            Circle(ESQUISSE26_R)
    extrude(amount=-ENL_V_MAT_EXTRU_25_DEPTH, mode=Mode.SUBTRACT)

    # Esquisse28 → Enlèv. mat.-Extru.26 (cut)
    with BuildSketch(Plane(origin=(0, 44, 0), x_dir=(-1, 0, 0), z_dir=(0, 1, 0))):
        with Locations((-30, 16.5)):
            Circle(ESQUISSE28_R)
        with Locations((5, 16.5)):
            Circle(ESQUISSE28_R)
    extrude(amount=-ENL_V_MAT_EXTRU_26_DEPTH, mode=Mode.SUBTRACT)

    # Chanfrein27
    chanfrein27_edges = [part.edges().sort_by_distance(p)[0] for p in [
        (33, 44, 16.5),
        (-2, 44, 16.5),
    ]]
    chamfer(chanfrein27_edges, length=CHANFREIN27_SIZE)

    # Chanfrein29
    chanfrein29_edges = [part.edges().sort_by_distance(p)[0] for p in [
        (40, 0, 35),
        (-21, 44, 16.5),
        (0, 44, 35),
        (40, 16, 4.5),
        (-40, 16, 4.5),
        (40, -44, 5.25),
        (-40, -44, 5.25),
        (0, -44, 10.5),
        (0, -44, 22.5),
        (40, -37, 22.5),
        (40, -30, 16.5),
        (40, -37, 10.5),
        (-40, -37.125, 22.5),
        (-40, 13.8, 35),
        (-40, -37.125, 10.5),
        (0, 44, 0),
        (-40, -26.64591319, 26.703063829),
        (40, 0, 0),
        (0, -44, 0),
        (40, -19, 8.25),
        (-40, 0, 0),
        (-40, -8.796936171, 8.85408681),
        (-40, -32.8, 35),
        (-40, -16.4, 31.991043583),
        (0, -44, 35),
        (-40, 44, 17.5),
        (40, 44, 17.5),
        (40, -44, 28.75),
        (-40, -44, 28.75),
    ]]
    chamfer(chanfrein29_edges, length=CHANFREIN29_SIZE)


solid = part.part
